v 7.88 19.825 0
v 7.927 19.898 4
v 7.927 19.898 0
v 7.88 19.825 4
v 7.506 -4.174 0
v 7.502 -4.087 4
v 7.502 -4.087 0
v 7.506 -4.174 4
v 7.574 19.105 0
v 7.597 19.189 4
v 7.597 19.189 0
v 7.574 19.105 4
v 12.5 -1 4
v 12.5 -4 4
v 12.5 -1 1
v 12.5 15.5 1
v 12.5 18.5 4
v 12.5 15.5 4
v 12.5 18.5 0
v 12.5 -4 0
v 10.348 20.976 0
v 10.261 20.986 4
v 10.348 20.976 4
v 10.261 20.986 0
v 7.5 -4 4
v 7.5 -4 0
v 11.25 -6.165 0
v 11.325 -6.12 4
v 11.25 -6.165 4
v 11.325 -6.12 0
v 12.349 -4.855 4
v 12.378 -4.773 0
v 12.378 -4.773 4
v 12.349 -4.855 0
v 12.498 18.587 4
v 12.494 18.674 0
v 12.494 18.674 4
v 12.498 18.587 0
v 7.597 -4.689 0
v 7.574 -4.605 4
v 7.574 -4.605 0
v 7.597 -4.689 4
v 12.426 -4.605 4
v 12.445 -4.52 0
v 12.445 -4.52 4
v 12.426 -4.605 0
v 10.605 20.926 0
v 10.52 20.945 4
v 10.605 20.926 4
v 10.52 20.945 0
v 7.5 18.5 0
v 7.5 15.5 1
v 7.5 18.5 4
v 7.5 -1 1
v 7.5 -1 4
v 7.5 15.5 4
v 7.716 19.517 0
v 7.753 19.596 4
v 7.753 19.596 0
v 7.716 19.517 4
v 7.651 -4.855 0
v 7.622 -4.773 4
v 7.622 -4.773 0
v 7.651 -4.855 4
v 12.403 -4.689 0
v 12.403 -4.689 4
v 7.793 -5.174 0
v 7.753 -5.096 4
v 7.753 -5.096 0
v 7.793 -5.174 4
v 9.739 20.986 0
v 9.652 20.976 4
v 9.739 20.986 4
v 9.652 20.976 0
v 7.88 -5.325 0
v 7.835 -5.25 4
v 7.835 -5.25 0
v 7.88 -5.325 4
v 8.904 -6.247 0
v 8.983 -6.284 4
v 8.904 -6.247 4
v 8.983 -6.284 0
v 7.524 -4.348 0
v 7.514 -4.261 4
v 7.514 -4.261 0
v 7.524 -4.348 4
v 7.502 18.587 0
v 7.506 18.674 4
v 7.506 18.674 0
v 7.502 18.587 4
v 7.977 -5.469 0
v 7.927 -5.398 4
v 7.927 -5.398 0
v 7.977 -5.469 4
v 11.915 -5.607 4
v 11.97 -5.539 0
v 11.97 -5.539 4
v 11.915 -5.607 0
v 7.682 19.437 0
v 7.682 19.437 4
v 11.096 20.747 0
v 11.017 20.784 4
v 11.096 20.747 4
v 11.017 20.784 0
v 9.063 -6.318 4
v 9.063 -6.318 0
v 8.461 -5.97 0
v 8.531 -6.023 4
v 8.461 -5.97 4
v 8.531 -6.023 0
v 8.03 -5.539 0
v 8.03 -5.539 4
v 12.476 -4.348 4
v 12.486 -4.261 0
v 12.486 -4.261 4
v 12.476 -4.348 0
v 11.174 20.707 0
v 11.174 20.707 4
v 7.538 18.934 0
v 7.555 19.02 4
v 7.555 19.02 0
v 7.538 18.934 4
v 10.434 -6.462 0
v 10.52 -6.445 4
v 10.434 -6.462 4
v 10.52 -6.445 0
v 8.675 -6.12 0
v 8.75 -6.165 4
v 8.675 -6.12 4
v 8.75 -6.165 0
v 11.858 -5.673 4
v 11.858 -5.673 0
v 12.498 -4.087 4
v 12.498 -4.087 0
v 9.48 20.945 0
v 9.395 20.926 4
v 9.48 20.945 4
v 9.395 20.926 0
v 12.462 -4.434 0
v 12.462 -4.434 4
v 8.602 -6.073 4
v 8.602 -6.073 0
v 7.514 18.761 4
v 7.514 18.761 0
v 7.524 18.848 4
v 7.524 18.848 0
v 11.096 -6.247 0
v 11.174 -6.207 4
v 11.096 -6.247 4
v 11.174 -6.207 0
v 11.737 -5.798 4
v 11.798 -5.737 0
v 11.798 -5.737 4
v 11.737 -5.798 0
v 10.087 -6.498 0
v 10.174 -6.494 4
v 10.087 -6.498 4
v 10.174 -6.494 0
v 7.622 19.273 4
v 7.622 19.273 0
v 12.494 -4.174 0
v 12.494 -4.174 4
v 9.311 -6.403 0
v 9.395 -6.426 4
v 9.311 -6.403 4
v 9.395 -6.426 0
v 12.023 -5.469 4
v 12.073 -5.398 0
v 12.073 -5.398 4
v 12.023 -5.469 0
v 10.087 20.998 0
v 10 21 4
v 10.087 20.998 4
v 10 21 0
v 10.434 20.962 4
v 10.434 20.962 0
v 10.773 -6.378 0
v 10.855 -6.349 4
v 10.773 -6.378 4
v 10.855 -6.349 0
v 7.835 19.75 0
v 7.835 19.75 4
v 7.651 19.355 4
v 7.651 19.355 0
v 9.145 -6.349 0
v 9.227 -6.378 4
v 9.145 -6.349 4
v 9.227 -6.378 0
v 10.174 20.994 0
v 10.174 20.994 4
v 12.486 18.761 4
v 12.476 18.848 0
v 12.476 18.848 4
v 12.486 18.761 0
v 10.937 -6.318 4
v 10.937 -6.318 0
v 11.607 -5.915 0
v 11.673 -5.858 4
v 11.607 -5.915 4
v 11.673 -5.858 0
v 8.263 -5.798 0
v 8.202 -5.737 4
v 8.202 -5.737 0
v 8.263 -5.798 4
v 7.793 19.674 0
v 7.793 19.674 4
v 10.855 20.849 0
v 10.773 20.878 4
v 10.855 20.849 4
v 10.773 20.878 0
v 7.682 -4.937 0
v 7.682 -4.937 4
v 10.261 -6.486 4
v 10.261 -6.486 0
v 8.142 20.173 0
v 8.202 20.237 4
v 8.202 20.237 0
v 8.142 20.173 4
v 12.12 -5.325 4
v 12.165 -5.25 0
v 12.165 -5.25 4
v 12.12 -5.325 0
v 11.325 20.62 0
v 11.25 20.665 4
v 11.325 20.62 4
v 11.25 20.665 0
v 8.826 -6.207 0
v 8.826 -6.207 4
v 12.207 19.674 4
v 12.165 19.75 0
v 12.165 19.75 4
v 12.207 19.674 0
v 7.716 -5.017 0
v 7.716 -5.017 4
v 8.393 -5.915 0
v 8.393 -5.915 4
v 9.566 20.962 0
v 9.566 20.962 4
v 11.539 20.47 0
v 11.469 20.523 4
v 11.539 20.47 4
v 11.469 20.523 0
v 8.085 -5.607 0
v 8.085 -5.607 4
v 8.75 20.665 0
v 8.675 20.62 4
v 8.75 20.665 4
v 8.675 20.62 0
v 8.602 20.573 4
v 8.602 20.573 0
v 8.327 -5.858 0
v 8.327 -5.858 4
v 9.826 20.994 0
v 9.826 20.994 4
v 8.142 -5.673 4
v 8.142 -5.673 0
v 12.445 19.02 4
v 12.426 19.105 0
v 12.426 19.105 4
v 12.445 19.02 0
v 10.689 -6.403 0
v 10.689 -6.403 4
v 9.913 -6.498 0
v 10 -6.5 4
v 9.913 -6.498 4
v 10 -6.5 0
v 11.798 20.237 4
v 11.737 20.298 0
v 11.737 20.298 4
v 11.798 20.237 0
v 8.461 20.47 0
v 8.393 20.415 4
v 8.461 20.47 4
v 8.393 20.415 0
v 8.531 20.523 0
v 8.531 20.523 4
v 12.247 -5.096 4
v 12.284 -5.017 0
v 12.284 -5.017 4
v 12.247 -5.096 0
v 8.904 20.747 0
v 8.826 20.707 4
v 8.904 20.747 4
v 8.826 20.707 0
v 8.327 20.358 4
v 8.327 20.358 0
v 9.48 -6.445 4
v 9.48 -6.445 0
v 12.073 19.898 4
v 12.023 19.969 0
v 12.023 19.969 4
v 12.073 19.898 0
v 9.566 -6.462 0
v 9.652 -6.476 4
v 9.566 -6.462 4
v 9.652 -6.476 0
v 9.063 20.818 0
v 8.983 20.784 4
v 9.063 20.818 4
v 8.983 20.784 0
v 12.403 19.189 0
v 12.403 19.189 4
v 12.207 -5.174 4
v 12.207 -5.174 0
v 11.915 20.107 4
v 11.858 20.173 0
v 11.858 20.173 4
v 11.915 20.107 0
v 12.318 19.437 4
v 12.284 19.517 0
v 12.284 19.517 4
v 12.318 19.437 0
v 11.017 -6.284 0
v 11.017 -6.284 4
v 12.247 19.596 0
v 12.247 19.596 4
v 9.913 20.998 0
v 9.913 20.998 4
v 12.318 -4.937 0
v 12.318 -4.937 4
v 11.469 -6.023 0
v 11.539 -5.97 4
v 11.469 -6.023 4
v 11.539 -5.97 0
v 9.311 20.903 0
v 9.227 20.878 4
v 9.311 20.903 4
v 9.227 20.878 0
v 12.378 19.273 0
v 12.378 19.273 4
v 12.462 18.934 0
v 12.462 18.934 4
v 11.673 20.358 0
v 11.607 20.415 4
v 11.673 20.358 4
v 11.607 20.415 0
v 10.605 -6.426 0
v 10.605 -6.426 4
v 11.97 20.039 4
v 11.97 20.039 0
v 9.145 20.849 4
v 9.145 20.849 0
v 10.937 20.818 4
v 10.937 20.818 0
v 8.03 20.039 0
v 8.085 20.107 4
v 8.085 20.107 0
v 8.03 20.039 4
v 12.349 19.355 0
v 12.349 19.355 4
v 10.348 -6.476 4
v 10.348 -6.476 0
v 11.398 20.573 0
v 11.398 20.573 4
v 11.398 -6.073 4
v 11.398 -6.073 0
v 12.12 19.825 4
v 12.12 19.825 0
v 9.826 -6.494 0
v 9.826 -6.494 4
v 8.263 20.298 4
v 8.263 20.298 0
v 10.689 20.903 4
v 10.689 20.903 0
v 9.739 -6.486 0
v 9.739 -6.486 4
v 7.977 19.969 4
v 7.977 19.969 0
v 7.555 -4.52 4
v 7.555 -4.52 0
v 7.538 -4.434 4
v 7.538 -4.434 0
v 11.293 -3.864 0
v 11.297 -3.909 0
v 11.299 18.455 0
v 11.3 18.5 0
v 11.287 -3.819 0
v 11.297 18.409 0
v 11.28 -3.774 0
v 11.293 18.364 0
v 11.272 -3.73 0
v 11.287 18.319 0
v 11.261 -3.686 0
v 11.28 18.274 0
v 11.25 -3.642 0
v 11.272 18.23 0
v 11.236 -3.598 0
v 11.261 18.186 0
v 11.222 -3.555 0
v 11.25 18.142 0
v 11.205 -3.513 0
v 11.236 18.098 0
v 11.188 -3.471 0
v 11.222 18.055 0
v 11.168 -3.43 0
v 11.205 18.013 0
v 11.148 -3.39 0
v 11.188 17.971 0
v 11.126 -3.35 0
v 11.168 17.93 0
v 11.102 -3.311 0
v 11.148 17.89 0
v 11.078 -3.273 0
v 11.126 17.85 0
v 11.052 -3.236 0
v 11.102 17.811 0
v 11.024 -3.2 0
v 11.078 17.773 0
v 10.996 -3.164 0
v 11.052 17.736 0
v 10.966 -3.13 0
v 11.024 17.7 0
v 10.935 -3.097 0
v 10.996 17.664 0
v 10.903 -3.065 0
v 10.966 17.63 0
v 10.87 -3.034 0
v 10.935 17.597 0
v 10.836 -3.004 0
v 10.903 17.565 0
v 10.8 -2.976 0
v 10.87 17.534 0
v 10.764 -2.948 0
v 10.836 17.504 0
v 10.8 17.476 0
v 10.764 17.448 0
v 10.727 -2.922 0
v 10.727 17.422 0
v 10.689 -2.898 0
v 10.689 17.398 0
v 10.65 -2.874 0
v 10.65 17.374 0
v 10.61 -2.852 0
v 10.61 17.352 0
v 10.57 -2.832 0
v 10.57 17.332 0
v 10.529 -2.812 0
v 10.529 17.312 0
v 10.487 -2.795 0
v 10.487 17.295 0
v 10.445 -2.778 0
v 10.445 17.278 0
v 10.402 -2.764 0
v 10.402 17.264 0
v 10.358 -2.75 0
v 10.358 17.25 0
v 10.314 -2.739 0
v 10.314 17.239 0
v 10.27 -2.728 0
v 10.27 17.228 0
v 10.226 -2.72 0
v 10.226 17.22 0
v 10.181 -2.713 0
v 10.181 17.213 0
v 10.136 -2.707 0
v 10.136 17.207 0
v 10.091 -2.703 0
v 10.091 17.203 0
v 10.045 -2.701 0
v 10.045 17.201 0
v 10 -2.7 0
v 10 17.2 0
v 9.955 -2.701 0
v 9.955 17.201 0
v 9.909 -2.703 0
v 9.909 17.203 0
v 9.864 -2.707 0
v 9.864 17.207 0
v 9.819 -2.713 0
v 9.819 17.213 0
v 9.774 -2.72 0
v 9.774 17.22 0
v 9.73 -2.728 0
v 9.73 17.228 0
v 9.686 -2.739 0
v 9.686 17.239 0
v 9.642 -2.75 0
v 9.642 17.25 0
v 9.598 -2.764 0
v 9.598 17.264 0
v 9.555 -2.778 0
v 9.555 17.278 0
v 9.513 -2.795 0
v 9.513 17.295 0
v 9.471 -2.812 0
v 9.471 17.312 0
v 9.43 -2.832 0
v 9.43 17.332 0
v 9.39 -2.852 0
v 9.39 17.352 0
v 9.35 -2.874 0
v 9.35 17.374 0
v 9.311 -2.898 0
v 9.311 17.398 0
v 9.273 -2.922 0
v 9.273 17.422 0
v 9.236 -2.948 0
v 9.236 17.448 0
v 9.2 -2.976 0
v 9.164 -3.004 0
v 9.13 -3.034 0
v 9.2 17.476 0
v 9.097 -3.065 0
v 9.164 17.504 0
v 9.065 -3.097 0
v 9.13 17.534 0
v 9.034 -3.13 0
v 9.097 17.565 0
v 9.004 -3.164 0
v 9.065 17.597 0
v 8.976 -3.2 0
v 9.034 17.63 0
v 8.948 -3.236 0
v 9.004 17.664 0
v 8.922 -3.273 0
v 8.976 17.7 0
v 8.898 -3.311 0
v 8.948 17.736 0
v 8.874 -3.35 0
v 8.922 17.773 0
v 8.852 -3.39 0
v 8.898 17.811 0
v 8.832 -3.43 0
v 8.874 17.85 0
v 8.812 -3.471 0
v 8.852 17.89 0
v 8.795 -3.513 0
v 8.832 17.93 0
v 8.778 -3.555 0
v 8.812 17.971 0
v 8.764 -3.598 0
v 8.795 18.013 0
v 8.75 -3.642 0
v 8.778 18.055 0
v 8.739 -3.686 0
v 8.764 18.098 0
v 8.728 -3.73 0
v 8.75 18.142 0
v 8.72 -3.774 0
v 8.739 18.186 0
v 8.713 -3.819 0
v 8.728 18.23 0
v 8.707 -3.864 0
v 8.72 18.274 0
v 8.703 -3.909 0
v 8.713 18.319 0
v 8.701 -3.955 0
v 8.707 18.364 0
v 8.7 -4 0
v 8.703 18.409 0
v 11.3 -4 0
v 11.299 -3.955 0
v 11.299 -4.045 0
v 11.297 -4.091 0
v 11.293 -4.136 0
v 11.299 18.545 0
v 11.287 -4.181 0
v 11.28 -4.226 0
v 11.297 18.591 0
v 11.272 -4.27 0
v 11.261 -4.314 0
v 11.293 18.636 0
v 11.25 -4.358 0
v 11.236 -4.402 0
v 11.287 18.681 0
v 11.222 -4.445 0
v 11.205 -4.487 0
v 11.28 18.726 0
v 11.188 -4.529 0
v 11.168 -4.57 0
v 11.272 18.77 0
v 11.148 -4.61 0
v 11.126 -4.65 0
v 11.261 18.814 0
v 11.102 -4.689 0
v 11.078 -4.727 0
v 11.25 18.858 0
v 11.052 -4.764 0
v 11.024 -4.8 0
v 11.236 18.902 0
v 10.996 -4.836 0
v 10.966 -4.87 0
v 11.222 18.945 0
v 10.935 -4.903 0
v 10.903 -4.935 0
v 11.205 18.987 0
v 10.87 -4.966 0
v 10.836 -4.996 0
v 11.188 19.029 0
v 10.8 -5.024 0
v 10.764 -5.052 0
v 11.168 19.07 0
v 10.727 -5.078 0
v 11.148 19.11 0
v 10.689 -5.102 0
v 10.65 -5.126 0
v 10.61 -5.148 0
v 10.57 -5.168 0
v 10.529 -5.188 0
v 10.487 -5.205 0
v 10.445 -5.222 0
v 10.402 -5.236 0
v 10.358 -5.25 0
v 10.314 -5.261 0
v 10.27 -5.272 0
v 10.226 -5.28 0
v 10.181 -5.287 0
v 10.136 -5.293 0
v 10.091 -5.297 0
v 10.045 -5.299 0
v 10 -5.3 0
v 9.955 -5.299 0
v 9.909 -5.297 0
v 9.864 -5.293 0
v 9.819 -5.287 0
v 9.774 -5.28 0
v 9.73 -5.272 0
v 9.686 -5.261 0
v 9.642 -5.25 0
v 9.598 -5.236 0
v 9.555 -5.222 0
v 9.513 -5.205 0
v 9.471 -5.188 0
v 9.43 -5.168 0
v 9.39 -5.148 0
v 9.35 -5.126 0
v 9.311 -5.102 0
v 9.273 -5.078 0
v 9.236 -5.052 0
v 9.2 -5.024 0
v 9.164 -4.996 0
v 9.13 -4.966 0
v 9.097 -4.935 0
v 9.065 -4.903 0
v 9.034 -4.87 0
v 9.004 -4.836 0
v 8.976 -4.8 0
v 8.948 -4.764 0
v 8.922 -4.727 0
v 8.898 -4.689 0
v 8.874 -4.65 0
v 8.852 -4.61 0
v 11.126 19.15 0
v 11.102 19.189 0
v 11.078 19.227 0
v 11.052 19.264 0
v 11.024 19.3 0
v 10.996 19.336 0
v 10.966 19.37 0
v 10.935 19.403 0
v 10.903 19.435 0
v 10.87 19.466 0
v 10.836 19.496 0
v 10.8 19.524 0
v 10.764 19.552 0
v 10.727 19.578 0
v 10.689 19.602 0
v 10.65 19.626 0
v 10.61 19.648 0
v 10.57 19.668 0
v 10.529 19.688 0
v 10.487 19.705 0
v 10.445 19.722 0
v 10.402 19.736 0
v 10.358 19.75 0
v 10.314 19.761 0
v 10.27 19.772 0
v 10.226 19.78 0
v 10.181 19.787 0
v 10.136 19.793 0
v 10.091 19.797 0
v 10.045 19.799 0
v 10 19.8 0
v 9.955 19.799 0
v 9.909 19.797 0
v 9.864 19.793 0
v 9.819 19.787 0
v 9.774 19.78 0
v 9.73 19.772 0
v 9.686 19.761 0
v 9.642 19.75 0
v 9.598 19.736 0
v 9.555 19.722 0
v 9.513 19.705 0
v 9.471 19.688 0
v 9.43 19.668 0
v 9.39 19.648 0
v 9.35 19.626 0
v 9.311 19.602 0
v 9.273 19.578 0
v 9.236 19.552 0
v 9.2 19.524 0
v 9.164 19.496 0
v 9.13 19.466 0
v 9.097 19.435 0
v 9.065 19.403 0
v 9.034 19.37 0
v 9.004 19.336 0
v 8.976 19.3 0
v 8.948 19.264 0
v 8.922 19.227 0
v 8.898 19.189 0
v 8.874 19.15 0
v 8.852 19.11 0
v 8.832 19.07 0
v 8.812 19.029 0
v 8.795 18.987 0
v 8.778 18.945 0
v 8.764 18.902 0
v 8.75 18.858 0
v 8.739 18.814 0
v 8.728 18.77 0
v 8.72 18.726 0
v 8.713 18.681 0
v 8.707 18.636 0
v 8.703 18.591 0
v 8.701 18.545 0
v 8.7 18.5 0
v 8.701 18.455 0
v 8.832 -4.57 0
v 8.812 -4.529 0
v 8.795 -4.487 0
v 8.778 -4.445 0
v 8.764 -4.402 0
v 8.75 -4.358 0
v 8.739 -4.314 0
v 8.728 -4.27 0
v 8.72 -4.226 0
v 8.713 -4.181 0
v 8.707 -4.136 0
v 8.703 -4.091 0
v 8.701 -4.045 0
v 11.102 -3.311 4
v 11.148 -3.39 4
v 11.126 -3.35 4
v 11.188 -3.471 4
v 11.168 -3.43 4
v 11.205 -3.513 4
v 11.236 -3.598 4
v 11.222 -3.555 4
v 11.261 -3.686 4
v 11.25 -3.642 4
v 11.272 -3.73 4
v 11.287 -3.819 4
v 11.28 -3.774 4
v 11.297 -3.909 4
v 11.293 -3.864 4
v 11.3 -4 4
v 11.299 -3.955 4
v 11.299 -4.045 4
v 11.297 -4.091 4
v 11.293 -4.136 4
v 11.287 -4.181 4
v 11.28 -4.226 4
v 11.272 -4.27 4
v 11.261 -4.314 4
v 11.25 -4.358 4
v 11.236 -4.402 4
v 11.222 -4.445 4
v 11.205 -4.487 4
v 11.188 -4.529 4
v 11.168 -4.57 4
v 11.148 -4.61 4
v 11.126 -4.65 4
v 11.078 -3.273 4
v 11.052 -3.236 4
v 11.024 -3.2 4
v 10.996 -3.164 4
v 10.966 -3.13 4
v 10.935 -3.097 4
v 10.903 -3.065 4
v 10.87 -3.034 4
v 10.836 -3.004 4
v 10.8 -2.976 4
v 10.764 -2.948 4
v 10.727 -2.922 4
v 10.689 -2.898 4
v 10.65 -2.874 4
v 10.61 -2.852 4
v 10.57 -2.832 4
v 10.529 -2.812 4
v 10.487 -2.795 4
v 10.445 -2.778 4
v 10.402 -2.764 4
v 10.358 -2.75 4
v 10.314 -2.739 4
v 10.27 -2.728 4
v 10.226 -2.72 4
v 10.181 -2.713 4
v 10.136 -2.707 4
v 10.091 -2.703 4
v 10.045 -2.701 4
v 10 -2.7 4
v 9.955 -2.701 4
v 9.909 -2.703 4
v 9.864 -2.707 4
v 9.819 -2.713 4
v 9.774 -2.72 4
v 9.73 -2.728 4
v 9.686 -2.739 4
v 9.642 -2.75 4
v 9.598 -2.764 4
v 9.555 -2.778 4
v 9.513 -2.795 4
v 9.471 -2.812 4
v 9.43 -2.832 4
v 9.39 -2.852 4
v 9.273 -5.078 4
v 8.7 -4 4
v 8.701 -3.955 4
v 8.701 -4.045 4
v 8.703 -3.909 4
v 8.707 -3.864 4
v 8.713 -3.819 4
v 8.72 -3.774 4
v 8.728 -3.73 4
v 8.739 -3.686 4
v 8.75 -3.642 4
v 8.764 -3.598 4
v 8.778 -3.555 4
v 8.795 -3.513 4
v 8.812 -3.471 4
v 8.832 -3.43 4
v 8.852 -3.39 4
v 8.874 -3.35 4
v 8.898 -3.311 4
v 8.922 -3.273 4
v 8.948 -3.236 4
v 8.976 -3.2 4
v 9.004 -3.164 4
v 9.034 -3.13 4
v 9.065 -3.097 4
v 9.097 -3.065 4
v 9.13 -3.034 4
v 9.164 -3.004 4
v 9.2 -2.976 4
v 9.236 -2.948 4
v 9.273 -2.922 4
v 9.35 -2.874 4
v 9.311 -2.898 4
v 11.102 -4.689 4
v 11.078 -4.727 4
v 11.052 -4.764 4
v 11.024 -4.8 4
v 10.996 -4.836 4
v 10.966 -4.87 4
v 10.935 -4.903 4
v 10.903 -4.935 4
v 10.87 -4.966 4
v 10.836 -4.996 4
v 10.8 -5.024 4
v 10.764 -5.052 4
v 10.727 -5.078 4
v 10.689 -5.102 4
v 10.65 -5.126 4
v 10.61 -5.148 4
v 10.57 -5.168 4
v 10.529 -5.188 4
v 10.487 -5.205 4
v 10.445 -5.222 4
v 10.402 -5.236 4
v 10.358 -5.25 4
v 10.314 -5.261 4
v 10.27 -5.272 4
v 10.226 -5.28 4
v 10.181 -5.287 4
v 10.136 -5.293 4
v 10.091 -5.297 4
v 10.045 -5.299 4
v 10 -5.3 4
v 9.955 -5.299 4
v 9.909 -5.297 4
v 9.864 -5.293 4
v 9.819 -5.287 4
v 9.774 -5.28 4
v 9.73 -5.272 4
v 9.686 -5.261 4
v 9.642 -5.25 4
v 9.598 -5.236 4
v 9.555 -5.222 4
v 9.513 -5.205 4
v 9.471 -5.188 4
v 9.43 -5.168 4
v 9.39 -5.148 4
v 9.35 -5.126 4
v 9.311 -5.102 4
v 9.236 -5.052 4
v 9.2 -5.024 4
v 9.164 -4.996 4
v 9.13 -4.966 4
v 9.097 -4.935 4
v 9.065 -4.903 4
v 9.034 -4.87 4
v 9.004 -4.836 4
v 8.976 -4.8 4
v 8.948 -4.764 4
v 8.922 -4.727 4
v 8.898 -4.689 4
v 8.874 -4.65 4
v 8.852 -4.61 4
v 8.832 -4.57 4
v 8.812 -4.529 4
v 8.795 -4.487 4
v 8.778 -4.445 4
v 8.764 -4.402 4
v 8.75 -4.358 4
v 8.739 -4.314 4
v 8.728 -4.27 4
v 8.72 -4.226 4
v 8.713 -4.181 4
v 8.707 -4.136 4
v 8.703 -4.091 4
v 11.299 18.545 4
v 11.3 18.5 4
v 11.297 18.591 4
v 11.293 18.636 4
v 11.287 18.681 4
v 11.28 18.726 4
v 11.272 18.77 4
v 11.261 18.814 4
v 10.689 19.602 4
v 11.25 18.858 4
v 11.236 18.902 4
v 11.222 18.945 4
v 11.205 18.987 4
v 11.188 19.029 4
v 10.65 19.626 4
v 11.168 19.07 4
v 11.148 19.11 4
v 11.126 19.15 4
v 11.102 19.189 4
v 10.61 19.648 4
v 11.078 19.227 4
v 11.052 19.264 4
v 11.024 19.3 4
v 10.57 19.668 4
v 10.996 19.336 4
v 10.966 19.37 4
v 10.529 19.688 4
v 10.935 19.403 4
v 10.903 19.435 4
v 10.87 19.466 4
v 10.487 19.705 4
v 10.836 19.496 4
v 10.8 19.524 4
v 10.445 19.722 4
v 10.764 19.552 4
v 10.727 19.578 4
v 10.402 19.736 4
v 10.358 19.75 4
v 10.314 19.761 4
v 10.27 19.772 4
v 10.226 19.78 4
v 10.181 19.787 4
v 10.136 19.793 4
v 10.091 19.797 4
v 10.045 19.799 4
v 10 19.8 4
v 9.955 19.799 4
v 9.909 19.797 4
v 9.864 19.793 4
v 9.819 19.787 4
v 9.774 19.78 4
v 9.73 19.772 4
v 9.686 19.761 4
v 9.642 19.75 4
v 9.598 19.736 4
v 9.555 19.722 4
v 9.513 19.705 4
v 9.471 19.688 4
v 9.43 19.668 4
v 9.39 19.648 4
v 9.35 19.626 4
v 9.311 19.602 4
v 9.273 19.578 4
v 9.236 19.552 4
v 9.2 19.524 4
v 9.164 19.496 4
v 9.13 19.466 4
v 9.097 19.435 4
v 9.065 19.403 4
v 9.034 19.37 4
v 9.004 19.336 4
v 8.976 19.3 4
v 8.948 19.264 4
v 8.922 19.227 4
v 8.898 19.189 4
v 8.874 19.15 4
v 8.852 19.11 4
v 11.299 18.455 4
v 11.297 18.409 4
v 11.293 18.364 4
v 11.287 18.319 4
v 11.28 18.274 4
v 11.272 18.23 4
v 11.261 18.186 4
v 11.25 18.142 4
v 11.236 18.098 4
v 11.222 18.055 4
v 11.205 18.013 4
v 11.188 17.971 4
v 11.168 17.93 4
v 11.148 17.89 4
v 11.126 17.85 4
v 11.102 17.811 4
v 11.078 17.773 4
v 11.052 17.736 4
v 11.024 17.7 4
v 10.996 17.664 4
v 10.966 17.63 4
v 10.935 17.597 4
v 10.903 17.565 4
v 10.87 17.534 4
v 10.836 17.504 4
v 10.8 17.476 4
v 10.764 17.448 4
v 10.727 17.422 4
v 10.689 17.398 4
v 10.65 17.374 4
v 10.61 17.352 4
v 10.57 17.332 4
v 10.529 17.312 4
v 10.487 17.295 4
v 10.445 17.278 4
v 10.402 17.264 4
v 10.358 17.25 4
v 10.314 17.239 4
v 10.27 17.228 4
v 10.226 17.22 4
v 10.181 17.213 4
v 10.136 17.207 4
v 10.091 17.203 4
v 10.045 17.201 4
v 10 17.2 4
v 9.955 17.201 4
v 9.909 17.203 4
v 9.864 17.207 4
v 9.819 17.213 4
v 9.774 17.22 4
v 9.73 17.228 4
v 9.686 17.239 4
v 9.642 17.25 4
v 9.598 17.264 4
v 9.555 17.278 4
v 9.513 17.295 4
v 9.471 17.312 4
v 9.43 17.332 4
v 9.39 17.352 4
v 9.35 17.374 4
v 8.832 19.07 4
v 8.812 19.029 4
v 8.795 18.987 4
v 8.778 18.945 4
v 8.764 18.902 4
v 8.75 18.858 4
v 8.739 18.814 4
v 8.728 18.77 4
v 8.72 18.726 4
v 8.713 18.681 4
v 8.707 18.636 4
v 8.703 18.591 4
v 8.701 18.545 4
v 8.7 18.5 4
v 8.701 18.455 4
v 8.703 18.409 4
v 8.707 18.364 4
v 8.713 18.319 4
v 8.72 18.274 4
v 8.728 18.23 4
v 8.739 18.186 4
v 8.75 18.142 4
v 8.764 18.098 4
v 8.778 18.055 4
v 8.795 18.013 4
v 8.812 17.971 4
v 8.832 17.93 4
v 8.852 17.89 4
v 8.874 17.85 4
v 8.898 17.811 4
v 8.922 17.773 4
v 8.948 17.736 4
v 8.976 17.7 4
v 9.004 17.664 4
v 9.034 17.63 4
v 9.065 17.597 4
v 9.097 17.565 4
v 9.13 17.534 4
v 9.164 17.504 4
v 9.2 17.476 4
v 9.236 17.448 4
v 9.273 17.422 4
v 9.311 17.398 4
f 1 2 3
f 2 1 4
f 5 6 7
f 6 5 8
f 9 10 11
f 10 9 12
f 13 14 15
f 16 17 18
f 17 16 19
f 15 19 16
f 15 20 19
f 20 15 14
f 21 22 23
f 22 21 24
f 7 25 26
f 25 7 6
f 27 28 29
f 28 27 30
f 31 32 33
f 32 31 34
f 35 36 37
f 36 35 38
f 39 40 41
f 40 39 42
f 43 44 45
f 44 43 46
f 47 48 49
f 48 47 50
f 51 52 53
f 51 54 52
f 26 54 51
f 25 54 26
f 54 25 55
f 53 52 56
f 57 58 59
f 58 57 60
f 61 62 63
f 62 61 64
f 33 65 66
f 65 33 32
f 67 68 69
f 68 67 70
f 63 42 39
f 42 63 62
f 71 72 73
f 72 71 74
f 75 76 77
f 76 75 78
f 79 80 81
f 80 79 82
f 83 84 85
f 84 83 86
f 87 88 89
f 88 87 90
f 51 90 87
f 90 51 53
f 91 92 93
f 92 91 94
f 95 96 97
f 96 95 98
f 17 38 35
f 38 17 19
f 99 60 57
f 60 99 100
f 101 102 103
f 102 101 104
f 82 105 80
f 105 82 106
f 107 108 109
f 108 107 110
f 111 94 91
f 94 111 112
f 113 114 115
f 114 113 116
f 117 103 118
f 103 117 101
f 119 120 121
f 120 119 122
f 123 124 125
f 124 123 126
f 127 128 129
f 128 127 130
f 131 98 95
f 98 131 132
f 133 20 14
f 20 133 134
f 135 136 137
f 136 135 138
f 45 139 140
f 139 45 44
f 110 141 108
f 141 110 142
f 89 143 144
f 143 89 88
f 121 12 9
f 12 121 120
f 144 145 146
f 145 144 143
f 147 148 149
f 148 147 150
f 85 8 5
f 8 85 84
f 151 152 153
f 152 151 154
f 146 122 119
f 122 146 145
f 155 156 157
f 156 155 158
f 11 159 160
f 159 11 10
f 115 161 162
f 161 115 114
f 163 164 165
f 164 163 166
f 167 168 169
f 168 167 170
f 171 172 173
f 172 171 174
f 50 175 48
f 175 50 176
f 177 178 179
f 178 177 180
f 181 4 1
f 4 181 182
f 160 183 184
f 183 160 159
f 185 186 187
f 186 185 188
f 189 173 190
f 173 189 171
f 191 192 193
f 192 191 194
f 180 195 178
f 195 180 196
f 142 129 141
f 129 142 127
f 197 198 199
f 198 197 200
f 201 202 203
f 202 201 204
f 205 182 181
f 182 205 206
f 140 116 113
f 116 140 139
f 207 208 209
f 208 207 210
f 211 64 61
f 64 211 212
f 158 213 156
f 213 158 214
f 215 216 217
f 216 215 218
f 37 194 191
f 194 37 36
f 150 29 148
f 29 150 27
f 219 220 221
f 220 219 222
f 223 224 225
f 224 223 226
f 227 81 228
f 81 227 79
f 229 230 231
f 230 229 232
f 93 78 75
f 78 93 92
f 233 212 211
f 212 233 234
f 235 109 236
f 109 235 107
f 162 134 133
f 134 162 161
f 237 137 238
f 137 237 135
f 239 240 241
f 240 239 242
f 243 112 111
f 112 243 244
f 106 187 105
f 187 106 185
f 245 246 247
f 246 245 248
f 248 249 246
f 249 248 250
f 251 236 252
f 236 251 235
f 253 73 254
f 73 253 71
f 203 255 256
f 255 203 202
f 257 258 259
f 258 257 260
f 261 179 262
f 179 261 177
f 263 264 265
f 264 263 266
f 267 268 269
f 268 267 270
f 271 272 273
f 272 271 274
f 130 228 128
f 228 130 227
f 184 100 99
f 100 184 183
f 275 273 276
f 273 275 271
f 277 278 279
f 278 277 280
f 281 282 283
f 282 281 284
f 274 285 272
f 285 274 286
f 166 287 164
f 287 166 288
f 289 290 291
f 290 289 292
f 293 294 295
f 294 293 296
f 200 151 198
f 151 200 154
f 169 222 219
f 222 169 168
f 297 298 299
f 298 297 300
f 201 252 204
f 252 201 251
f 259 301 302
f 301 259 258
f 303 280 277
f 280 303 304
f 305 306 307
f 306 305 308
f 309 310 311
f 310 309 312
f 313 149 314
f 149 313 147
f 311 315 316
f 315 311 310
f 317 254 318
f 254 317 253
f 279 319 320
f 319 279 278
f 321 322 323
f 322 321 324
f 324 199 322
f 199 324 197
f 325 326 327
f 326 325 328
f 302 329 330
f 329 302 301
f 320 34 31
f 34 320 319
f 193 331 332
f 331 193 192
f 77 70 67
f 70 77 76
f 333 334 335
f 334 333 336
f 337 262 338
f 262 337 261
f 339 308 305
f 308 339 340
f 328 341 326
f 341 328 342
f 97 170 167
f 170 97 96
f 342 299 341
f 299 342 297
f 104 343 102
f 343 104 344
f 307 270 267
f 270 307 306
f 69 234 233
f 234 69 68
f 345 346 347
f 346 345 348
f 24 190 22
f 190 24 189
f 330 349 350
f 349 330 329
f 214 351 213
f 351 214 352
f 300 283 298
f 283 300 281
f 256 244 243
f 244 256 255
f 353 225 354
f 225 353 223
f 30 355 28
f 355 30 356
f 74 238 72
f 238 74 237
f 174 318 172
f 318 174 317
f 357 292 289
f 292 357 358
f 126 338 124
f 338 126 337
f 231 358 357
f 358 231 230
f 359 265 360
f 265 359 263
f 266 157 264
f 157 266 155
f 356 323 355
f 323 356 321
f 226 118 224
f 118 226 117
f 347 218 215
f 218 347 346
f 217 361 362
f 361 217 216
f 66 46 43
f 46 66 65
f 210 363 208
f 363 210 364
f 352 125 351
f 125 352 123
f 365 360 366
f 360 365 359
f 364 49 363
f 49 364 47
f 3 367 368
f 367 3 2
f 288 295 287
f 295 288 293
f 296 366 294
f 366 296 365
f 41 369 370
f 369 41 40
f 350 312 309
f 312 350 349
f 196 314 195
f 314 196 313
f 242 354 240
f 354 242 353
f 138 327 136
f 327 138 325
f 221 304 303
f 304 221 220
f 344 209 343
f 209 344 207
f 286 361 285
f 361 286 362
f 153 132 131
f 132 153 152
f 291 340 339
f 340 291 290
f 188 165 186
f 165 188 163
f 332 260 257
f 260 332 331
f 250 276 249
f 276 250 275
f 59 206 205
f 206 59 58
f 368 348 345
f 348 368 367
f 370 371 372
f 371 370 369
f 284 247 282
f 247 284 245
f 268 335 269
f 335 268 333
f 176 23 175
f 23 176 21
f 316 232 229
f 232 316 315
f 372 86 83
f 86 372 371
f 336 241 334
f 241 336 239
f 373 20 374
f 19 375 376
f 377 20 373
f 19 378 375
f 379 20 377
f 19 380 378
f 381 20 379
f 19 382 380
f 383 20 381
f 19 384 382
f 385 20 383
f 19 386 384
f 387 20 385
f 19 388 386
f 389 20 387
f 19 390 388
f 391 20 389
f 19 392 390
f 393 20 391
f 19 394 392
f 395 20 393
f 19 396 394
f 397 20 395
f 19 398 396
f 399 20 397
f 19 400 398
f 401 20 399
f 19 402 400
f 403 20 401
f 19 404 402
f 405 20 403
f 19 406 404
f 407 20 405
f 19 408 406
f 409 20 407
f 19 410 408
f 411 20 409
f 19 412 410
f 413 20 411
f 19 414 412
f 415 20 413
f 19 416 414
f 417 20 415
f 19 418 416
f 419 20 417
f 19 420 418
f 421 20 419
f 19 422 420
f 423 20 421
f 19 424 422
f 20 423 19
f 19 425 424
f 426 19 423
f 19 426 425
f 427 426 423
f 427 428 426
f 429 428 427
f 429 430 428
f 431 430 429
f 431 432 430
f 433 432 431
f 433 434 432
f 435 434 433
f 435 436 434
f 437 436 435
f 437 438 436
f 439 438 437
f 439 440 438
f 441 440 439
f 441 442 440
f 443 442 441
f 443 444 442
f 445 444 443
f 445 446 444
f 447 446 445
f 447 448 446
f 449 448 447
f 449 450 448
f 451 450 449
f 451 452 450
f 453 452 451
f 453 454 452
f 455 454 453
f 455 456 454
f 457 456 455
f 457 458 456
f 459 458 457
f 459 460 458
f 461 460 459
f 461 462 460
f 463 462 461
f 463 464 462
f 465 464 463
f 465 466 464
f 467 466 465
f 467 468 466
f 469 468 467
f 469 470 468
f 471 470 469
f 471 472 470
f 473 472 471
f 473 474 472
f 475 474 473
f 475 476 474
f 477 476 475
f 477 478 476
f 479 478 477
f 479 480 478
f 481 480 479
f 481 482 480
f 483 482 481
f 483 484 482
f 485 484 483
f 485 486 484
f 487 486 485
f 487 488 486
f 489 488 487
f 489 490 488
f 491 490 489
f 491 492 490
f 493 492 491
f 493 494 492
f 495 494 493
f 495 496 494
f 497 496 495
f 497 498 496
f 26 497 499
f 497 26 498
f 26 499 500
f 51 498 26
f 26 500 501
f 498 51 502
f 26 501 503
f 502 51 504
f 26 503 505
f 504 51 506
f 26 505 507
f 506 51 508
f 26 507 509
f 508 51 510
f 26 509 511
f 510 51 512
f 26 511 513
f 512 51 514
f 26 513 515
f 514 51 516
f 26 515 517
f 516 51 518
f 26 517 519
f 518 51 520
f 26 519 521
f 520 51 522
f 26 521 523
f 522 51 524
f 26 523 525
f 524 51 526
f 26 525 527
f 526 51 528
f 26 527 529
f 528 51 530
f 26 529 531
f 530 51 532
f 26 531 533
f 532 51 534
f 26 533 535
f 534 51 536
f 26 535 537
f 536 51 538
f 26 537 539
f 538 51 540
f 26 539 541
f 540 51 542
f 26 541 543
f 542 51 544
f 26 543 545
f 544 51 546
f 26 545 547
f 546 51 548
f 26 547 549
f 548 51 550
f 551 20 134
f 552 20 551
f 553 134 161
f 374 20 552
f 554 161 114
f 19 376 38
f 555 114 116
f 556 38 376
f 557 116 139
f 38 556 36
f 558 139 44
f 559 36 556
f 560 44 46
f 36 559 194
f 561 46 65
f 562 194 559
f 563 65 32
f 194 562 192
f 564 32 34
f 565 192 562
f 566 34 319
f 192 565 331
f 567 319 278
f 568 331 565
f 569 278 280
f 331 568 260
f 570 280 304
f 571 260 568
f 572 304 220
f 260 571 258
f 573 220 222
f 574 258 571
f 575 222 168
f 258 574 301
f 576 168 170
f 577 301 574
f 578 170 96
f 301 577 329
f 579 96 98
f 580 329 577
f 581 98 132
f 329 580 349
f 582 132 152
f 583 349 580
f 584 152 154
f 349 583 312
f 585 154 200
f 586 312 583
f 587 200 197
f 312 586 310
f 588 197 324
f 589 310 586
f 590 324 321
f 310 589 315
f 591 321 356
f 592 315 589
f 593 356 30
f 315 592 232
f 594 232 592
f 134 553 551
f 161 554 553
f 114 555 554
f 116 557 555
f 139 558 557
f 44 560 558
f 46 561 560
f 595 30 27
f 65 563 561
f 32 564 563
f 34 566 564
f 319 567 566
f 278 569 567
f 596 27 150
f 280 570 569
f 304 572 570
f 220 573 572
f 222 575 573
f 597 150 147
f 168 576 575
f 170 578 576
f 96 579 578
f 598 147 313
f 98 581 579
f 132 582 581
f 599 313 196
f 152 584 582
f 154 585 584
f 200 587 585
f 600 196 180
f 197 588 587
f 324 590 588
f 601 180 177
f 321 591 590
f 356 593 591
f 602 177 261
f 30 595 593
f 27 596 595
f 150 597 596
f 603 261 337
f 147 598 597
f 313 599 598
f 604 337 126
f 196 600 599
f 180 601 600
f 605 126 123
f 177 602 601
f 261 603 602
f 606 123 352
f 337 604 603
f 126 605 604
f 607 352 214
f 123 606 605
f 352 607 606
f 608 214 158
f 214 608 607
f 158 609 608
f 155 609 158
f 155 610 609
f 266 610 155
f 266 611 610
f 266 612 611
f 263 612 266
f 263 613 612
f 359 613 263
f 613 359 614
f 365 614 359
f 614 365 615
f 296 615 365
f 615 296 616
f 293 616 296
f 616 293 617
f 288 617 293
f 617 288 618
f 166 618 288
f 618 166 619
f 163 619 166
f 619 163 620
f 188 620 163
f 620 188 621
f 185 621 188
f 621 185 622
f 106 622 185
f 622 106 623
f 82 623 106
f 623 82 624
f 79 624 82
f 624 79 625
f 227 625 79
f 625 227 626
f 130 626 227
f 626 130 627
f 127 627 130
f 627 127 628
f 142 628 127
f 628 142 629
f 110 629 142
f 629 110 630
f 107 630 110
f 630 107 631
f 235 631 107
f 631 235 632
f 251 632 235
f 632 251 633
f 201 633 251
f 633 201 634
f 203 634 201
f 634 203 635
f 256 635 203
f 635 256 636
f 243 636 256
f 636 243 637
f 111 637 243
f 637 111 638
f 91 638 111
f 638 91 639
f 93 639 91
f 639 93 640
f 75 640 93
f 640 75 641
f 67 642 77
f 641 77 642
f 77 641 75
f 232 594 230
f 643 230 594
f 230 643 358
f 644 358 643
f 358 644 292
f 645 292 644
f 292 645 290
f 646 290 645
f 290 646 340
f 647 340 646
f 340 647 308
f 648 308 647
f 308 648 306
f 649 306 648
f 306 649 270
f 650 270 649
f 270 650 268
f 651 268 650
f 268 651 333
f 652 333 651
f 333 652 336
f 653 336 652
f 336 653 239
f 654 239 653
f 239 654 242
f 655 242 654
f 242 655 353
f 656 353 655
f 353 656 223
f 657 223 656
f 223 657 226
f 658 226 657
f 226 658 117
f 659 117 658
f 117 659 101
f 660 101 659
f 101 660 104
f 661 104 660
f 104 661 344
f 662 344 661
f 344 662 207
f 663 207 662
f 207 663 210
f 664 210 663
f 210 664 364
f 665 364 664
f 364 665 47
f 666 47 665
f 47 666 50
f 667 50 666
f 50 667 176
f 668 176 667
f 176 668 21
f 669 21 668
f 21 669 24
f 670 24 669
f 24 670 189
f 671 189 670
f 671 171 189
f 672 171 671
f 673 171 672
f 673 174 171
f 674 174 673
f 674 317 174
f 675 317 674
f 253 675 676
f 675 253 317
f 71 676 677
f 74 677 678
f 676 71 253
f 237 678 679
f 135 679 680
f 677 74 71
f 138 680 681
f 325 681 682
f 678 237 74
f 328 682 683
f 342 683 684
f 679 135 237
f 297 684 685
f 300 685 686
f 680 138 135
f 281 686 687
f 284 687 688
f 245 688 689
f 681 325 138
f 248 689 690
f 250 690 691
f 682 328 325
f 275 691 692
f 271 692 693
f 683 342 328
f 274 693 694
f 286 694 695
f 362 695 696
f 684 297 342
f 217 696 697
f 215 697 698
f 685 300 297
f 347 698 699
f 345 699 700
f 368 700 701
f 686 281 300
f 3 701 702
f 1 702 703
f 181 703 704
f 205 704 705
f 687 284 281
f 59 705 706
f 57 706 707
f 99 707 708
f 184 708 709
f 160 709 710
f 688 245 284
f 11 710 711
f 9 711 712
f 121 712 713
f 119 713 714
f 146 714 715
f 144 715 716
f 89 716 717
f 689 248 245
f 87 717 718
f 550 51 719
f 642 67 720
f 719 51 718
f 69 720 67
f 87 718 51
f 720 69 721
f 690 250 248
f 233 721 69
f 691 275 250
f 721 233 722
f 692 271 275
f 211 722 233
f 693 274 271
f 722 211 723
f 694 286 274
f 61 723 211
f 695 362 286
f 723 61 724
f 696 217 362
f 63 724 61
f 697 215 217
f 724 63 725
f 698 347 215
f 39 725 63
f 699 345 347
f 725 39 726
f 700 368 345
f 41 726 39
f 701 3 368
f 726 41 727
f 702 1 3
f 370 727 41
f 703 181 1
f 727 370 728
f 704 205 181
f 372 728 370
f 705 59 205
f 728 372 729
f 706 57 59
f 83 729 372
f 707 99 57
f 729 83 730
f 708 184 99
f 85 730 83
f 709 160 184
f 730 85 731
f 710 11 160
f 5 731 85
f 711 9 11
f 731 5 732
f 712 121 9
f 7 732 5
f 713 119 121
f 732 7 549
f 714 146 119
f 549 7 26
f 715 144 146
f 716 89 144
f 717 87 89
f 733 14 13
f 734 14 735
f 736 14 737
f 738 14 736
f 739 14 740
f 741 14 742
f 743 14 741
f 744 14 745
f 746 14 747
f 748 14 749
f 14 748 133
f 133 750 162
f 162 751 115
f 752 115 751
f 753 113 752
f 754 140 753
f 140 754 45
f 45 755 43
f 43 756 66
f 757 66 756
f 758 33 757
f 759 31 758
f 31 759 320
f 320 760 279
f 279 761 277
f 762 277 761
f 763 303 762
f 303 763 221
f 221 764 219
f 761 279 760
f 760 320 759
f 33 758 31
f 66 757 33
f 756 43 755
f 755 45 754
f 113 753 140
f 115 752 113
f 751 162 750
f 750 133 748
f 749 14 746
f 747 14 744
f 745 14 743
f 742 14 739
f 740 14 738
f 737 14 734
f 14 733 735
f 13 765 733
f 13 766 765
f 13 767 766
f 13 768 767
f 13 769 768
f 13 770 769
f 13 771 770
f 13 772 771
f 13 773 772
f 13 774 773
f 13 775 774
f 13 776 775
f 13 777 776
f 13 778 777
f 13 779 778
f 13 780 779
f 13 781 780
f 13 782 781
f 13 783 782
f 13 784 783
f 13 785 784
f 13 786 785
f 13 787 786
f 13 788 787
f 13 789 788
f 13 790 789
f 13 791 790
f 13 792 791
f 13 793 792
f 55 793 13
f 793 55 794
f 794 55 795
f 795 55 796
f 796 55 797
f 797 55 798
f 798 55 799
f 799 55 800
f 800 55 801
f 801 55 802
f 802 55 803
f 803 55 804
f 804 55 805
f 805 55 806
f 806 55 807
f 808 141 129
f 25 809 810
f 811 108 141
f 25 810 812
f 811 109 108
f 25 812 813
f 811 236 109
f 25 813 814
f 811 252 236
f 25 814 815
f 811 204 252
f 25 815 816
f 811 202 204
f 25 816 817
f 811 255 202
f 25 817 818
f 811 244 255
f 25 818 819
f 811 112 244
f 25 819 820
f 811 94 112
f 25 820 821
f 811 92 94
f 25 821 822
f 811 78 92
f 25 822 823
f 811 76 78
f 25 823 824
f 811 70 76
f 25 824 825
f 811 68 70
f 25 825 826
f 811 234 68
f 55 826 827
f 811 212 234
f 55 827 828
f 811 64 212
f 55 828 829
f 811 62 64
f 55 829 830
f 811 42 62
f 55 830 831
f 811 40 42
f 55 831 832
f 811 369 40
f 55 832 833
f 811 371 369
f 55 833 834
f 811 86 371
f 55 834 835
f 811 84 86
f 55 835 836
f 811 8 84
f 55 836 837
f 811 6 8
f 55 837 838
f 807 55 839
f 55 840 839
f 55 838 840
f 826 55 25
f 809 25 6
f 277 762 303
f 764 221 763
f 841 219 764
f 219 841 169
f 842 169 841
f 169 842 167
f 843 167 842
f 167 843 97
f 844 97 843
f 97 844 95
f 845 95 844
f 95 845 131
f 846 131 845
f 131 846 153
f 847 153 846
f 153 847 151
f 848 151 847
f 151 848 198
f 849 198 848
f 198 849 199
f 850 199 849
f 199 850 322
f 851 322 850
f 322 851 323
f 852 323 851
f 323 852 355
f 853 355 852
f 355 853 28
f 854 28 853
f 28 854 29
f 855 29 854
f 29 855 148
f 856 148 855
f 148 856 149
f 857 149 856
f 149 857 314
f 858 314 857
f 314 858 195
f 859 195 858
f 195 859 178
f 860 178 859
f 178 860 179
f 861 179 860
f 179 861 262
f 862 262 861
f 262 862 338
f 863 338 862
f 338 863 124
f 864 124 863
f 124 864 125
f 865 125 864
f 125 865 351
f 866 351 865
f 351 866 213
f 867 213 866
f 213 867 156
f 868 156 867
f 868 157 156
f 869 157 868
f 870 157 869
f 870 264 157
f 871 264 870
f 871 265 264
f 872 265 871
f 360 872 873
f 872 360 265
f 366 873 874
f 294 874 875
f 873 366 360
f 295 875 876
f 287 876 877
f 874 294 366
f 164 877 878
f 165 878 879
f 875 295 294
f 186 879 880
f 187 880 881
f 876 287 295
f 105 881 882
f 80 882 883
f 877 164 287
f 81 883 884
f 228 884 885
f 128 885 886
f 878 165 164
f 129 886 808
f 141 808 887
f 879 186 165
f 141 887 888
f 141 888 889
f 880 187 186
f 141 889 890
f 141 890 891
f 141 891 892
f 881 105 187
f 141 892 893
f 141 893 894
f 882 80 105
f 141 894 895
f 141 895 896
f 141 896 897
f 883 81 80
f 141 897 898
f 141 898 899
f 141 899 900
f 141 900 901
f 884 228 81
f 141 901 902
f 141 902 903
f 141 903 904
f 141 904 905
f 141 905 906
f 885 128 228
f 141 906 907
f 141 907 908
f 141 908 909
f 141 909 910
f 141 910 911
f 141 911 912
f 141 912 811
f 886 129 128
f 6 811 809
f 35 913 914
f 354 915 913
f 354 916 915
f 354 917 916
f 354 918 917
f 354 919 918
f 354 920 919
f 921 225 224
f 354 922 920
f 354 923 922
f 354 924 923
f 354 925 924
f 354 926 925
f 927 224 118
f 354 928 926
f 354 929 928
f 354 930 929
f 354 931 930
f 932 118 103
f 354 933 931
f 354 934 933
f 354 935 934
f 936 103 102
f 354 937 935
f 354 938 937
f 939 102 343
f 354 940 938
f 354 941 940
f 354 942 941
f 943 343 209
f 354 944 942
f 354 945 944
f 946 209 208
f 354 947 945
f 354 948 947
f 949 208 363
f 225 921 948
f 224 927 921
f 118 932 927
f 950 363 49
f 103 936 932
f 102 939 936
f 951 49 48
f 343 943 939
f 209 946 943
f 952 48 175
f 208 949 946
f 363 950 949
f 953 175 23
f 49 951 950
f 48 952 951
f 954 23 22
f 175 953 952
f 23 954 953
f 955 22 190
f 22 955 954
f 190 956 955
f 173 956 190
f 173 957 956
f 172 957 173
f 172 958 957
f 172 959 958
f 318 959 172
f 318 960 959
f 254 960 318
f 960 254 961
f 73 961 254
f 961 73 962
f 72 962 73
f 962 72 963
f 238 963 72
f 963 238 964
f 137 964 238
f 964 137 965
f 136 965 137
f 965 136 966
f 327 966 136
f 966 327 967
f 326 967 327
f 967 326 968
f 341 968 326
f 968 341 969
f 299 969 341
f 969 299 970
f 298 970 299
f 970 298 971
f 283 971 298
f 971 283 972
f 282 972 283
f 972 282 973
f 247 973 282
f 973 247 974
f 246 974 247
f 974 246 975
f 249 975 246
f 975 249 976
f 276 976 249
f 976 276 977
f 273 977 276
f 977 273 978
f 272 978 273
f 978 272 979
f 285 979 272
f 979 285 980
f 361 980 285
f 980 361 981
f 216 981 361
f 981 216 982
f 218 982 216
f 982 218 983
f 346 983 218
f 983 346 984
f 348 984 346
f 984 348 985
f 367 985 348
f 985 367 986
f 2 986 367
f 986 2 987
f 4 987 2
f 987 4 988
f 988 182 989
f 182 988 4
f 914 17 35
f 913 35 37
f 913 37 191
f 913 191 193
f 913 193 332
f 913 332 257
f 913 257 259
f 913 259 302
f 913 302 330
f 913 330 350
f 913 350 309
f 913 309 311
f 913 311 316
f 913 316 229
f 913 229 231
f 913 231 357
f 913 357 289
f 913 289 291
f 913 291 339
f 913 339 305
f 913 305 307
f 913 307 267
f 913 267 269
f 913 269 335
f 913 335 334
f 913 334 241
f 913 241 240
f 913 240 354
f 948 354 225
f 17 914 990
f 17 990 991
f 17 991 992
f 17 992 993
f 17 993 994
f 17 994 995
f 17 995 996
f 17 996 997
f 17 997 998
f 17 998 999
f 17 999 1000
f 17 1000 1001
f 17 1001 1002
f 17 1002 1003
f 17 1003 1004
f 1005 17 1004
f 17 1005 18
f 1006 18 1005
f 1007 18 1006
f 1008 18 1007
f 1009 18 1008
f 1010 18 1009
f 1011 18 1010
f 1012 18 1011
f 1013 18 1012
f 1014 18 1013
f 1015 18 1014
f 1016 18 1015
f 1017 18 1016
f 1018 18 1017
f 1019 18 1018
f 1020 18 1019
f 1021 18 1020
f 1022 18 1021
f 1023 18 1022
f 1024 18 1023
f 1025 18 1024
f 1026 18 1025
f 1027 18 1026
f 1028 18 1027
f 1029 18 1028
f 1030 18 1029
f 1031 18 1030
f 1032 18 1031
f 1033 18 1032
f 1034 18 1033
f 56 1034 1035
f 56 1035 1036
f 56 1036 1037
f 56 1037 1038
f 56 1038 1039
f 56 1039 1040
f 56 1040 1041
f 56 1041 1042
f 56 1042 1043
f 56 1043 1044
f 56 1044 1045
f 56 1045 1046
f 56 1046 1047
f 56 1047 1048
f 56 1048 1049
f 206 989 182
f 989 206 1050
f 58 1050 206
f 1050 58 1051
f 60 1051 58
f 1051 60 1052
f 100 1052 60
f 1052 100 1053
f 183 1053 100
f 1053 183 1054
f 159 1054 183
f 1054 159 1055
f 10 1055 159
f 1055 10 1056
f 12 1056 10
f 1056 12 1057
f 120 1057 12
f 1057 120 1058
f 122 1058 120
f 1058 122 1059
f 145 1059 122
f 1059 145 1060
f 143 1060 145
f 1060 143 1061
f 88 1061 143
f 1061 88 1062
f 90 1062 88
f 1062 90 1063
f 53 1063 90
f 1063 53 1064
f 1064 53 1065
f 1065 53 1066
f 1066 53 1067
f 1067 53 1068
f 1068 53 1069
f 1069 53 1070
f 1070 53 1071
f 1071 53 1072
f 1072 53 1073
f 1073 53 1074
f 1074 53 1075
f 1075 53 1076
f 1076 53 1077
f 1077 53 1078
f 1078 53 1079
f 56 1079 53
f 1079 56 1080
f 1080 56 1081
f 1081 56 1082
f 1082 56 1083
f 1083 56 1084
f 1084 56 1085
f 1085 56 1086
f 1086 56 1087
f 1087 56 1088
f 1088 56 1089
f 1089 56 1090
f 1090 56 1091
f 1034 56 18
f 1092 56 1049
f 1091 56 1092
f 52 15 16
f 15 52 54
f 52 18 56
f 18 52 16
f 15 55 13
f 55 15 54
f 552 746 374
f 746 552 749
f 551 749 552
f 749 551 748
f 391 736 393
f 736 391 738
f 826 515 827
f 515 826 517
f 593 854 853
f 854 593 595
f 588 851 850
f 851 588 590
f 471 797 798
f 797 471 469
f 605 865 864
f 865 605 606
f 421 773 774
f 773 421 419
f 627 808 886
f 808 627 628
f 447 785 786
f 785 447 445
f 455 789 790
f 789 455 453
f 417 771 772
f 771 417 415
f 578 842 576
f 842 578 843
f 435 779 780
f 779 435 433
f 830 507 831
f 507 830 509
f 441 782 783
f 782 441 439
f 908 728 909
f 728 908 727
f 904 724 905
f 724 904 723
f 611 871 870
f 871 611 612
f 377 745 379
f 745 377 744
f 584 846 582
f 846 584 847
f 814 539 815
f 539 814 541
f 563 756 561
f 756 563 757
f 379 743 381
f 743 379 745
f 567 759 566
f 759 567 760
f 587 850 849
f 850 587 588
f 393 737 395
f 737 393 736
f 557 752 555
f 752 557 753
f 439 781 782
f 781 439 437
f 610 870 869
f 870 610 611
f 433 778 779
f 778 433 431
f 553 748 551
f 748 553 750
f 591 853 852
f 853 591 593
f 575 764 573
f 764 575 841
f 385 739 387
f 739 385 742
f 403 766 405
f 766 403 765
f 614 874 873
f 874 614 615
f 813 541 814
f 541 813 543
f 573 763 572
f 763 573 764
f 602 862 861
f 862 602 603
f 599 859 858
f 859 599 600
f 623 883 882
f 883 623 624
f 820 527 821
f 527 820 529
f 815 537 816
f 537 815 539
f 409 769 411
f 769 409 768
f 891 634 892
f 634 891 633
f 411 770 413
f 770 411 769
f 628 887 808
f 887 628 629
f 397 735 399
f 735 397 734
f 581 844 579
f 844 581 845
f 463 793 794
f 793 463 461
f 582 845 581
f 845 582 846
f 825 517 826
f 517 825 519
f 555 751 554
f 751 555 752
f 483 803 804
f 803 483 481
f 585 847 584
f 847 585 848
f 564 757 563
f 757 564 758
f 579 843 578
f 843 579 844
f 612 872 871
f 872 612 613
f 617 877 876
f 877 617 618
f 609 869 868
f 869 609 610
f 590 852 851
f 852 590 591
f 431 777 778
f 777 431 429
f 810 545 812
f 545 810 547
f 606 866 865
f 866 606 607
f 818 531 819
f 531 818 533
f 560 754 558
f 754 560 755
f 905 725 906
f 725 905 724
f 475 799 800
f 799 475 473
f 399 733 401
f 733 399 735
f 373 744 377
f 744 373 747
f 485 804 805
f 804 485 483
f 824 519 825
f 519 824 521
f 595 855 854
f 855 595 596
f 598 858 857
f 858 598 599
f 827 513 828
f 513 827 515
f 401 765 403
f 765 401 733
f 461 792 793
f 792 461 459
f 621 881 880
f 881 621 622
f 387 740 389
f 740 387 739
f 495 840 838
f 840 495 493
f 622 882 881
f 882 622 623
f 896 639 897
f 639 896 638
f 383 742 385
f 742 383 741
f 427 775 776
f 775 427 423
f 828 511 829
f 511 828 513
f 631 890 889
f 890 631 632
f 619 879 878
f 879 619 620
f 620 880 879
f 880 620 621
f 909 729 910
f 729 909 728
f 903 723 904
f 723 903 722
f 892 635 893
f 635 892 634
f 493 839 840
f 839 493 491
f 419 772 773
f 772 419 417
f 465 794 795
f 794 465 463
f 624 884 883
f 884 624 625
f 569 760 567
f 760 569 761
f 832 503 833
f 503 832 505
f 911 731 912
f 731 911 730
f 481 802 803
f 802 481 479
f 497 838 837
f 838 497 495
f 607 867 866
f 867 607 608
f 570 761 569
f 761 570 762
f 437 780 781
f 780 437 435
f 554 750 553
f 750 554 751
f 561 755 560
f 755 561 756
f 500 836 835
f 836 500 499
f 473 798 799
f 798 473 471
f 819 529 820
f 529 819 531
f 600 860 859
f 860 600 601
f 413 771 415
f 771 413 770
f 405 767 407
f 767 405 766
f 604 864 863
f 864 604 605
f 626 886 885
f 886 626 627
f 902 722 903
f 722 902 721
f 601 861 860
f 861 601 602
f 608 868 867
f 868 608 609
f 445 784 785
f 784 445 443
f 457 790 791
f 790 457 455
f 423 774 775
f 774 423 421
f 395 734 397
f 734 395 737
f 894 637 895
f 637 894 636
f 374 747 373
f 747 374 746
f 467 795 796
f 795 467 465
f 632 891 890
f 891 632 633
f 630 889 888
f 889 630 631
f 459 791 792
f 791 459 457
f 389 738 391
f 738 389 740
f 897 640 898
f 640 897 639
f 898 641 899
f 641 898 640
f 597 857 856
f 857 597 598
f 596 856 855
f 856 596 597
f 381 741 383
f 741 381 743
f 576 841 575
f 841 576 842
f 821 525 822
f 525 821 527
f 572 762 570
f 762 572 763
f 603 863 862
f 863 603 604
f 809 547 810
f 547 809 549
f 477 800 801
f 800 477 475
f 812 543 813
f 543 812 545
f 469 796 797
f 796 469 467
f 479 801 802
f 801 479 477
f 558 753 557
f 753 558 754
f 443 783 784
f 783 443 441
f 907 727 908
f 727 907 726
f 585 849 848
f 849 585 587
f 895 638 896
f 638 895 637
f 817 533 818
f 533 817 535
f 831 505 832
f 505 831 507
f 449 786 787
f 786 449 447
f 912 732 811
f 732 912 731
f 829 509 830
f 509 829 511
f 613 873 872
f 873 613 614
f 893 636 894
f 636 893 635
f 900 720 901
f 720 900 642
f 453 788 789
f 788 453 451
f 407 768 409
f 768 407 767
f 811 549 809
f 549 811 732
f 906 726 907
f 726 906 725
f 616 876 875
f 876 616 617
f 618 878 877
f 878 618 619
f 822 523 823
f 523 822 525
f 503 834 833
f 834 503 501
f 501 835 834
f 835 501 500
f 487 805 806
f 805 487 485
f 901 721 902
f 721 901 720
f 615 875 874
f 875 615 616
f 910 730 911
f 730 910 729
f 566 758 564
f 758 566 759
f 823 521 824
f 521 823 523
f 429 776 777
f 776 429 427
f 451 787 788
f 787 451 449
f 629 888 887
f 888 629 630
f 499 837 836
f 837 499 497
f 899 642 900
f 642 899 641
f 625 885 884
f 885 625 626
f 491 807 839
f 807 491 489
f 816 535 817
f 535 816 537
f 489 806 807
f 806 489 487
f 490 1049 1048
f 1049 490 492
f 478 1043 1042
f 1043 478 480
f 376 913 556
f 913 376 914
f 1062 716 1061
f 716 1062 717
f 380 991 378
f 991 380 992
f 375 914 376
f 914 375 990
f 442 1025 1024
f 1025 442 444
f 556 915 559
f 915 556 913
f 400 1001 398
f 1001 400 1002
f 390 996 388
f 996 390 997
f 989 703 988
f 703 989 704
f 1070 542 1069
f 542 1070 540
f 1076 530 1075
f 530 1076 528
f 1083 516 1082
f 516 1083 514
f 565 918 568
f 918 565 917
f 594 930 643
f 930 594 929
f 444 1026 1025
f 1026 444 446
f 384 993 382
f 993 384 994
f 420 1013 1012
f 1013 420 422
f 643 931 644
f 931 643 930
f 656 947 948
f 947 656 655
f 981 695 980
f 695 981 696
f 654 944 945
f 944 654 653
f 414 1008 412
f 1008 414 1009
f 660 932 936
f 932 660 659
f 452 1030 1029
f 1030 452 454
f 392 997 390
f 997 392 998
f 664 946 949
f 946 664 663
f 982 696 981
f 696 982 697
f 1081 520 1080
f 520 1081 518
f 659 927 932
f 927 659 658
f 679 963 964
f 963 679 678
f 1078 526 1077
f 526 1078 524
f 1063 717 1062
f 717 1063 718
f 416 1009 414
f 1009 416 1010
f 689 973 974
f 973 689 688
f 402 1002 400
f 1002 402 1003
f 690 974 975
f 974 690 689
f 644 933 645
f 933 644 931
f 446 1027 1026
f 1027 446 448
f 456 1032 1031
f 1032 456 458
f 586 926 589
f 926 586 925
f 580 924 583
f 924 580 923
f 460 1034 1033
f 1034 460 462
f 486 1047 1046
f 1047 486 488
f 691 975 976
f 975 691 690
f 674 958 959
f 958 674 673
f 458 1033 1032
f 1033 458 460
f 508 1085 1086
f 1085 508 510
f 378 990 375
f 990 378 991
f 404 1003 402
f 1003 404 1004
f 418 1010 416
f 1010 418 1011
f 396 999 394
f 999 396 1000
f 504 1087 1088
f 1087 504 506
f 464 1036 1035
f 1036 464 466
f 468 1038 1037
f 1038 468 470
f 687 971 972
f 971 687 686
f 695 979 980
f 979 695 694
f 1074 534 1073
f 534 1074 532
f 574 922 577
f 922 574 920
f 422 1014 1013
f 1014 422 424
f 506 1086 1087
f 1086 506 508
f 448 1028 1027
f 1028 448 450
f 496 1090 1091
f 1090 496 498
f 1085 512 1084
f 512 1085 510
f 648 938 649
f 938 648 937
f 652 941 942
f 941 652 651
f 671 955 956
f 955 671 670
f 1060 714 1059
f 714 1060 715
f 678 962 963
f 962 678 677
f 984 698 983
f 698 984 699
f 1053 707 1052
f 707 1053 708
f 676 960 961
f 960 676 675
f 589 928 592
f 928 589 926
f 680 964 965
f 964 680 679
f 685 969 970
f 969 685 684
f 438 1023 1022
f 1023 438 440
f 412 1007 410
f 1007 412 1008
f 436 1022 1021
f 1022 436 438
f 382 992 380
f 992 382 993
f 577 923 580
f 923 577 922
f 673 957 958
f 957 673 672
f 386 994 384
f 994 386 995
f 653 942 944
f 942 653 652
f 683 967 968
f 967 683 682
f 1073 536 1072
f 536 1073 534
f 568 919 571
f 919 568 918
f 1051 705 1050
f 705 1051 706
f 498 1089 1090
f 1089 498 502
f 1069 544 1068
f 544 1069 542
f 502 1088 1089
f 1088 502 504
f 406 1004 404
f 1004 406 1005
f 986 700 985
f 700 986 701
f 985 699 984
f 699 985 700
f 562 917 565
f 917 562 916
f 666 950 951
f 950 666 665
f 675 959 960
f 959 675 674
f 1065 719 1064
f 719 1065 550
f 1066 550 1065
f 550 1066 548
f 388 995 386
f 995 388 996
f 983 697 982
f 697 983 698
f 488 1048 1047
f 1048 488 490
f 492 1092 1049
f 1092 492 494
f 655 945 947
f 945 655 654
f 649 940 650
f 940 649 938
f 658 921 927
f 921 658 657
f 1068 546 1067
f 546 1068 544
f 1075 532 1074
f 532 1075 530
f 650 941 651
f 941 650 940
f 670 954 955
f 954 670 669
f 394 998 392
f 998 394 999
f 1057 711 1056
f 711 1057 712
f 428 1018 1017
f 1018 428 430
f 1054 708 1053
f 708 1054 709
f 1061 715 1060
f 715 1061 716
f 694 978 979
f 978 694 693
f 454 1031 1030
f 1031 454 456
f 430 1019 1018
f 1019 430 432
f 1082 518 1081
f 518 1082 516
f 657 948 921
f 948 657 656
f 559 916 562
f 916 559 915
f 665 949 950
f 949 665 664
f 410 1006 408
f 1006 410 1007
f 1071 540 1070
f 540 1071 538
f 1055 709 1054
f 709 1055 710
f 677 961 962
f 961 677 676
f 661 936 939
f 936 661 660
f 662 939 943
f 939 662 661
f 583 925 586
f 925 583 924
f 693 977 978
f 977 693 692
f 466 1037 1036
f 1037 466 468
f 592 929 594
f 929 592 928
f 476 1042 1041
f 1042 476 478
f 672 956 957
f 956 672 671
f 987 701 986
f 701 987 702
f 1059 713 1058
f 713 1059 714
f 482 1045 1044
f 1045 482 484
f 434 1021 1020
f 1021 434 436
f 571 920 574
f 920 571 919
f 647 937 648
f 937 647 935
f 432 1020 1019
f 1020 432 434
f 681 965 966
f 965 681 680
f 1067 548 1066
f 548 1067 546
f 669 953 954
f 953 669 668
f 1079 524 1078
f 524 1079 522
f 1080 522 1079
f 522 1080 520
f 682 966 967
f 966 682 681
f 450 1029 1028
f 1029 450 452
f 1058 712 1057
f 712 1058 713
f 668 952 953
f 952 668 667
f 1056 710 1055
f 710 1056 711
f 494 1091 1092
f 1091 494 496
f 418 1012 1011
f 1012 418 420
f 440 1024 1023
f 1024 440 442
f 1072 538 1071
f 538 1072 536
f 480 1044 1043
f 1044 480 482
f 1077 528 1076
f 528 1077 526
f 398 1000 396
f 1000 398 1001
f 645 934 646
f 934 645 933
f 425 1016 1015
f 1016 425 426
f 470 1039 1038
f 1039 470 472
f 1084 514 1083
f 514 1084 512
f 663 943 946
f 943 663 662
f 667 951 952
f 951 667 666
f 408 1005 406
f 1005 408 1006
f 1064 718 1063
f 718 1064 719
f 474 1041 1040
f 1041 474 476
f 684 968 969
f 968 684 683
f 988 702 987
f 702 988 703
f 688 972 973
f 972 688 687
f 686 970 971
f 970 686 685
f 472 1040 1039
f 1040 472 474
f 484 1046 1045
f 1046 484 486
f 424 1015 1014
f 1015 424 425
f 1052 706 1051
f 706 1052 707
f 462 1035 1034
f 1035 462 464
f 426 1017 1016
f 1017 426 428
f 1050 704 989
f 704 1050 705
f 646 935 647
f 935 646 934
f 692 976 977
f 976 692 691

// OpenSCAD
$fn=180;
eps=0.01;
m2_thrd=1.98/2;
m2_hole=2.60/2;
m25_thrd=2.46/2;
m25_hole=3.06/2;

difference() {
    linear_extrude(4) hull() {
        translate([10, -4, 0]) circle(2.5);
        translate([10, 18.5, 0]) circle(2.5);
    }
    translate([0, -1, 1.0]) cube([99, 16.5, 99]);
    translate([10, -4, -eps]) cylinder(99, m2_hole, m2_hole);
    translate([10, 18.5, -eps]) cylinder(99, m2_hole, m2_hole);

}
